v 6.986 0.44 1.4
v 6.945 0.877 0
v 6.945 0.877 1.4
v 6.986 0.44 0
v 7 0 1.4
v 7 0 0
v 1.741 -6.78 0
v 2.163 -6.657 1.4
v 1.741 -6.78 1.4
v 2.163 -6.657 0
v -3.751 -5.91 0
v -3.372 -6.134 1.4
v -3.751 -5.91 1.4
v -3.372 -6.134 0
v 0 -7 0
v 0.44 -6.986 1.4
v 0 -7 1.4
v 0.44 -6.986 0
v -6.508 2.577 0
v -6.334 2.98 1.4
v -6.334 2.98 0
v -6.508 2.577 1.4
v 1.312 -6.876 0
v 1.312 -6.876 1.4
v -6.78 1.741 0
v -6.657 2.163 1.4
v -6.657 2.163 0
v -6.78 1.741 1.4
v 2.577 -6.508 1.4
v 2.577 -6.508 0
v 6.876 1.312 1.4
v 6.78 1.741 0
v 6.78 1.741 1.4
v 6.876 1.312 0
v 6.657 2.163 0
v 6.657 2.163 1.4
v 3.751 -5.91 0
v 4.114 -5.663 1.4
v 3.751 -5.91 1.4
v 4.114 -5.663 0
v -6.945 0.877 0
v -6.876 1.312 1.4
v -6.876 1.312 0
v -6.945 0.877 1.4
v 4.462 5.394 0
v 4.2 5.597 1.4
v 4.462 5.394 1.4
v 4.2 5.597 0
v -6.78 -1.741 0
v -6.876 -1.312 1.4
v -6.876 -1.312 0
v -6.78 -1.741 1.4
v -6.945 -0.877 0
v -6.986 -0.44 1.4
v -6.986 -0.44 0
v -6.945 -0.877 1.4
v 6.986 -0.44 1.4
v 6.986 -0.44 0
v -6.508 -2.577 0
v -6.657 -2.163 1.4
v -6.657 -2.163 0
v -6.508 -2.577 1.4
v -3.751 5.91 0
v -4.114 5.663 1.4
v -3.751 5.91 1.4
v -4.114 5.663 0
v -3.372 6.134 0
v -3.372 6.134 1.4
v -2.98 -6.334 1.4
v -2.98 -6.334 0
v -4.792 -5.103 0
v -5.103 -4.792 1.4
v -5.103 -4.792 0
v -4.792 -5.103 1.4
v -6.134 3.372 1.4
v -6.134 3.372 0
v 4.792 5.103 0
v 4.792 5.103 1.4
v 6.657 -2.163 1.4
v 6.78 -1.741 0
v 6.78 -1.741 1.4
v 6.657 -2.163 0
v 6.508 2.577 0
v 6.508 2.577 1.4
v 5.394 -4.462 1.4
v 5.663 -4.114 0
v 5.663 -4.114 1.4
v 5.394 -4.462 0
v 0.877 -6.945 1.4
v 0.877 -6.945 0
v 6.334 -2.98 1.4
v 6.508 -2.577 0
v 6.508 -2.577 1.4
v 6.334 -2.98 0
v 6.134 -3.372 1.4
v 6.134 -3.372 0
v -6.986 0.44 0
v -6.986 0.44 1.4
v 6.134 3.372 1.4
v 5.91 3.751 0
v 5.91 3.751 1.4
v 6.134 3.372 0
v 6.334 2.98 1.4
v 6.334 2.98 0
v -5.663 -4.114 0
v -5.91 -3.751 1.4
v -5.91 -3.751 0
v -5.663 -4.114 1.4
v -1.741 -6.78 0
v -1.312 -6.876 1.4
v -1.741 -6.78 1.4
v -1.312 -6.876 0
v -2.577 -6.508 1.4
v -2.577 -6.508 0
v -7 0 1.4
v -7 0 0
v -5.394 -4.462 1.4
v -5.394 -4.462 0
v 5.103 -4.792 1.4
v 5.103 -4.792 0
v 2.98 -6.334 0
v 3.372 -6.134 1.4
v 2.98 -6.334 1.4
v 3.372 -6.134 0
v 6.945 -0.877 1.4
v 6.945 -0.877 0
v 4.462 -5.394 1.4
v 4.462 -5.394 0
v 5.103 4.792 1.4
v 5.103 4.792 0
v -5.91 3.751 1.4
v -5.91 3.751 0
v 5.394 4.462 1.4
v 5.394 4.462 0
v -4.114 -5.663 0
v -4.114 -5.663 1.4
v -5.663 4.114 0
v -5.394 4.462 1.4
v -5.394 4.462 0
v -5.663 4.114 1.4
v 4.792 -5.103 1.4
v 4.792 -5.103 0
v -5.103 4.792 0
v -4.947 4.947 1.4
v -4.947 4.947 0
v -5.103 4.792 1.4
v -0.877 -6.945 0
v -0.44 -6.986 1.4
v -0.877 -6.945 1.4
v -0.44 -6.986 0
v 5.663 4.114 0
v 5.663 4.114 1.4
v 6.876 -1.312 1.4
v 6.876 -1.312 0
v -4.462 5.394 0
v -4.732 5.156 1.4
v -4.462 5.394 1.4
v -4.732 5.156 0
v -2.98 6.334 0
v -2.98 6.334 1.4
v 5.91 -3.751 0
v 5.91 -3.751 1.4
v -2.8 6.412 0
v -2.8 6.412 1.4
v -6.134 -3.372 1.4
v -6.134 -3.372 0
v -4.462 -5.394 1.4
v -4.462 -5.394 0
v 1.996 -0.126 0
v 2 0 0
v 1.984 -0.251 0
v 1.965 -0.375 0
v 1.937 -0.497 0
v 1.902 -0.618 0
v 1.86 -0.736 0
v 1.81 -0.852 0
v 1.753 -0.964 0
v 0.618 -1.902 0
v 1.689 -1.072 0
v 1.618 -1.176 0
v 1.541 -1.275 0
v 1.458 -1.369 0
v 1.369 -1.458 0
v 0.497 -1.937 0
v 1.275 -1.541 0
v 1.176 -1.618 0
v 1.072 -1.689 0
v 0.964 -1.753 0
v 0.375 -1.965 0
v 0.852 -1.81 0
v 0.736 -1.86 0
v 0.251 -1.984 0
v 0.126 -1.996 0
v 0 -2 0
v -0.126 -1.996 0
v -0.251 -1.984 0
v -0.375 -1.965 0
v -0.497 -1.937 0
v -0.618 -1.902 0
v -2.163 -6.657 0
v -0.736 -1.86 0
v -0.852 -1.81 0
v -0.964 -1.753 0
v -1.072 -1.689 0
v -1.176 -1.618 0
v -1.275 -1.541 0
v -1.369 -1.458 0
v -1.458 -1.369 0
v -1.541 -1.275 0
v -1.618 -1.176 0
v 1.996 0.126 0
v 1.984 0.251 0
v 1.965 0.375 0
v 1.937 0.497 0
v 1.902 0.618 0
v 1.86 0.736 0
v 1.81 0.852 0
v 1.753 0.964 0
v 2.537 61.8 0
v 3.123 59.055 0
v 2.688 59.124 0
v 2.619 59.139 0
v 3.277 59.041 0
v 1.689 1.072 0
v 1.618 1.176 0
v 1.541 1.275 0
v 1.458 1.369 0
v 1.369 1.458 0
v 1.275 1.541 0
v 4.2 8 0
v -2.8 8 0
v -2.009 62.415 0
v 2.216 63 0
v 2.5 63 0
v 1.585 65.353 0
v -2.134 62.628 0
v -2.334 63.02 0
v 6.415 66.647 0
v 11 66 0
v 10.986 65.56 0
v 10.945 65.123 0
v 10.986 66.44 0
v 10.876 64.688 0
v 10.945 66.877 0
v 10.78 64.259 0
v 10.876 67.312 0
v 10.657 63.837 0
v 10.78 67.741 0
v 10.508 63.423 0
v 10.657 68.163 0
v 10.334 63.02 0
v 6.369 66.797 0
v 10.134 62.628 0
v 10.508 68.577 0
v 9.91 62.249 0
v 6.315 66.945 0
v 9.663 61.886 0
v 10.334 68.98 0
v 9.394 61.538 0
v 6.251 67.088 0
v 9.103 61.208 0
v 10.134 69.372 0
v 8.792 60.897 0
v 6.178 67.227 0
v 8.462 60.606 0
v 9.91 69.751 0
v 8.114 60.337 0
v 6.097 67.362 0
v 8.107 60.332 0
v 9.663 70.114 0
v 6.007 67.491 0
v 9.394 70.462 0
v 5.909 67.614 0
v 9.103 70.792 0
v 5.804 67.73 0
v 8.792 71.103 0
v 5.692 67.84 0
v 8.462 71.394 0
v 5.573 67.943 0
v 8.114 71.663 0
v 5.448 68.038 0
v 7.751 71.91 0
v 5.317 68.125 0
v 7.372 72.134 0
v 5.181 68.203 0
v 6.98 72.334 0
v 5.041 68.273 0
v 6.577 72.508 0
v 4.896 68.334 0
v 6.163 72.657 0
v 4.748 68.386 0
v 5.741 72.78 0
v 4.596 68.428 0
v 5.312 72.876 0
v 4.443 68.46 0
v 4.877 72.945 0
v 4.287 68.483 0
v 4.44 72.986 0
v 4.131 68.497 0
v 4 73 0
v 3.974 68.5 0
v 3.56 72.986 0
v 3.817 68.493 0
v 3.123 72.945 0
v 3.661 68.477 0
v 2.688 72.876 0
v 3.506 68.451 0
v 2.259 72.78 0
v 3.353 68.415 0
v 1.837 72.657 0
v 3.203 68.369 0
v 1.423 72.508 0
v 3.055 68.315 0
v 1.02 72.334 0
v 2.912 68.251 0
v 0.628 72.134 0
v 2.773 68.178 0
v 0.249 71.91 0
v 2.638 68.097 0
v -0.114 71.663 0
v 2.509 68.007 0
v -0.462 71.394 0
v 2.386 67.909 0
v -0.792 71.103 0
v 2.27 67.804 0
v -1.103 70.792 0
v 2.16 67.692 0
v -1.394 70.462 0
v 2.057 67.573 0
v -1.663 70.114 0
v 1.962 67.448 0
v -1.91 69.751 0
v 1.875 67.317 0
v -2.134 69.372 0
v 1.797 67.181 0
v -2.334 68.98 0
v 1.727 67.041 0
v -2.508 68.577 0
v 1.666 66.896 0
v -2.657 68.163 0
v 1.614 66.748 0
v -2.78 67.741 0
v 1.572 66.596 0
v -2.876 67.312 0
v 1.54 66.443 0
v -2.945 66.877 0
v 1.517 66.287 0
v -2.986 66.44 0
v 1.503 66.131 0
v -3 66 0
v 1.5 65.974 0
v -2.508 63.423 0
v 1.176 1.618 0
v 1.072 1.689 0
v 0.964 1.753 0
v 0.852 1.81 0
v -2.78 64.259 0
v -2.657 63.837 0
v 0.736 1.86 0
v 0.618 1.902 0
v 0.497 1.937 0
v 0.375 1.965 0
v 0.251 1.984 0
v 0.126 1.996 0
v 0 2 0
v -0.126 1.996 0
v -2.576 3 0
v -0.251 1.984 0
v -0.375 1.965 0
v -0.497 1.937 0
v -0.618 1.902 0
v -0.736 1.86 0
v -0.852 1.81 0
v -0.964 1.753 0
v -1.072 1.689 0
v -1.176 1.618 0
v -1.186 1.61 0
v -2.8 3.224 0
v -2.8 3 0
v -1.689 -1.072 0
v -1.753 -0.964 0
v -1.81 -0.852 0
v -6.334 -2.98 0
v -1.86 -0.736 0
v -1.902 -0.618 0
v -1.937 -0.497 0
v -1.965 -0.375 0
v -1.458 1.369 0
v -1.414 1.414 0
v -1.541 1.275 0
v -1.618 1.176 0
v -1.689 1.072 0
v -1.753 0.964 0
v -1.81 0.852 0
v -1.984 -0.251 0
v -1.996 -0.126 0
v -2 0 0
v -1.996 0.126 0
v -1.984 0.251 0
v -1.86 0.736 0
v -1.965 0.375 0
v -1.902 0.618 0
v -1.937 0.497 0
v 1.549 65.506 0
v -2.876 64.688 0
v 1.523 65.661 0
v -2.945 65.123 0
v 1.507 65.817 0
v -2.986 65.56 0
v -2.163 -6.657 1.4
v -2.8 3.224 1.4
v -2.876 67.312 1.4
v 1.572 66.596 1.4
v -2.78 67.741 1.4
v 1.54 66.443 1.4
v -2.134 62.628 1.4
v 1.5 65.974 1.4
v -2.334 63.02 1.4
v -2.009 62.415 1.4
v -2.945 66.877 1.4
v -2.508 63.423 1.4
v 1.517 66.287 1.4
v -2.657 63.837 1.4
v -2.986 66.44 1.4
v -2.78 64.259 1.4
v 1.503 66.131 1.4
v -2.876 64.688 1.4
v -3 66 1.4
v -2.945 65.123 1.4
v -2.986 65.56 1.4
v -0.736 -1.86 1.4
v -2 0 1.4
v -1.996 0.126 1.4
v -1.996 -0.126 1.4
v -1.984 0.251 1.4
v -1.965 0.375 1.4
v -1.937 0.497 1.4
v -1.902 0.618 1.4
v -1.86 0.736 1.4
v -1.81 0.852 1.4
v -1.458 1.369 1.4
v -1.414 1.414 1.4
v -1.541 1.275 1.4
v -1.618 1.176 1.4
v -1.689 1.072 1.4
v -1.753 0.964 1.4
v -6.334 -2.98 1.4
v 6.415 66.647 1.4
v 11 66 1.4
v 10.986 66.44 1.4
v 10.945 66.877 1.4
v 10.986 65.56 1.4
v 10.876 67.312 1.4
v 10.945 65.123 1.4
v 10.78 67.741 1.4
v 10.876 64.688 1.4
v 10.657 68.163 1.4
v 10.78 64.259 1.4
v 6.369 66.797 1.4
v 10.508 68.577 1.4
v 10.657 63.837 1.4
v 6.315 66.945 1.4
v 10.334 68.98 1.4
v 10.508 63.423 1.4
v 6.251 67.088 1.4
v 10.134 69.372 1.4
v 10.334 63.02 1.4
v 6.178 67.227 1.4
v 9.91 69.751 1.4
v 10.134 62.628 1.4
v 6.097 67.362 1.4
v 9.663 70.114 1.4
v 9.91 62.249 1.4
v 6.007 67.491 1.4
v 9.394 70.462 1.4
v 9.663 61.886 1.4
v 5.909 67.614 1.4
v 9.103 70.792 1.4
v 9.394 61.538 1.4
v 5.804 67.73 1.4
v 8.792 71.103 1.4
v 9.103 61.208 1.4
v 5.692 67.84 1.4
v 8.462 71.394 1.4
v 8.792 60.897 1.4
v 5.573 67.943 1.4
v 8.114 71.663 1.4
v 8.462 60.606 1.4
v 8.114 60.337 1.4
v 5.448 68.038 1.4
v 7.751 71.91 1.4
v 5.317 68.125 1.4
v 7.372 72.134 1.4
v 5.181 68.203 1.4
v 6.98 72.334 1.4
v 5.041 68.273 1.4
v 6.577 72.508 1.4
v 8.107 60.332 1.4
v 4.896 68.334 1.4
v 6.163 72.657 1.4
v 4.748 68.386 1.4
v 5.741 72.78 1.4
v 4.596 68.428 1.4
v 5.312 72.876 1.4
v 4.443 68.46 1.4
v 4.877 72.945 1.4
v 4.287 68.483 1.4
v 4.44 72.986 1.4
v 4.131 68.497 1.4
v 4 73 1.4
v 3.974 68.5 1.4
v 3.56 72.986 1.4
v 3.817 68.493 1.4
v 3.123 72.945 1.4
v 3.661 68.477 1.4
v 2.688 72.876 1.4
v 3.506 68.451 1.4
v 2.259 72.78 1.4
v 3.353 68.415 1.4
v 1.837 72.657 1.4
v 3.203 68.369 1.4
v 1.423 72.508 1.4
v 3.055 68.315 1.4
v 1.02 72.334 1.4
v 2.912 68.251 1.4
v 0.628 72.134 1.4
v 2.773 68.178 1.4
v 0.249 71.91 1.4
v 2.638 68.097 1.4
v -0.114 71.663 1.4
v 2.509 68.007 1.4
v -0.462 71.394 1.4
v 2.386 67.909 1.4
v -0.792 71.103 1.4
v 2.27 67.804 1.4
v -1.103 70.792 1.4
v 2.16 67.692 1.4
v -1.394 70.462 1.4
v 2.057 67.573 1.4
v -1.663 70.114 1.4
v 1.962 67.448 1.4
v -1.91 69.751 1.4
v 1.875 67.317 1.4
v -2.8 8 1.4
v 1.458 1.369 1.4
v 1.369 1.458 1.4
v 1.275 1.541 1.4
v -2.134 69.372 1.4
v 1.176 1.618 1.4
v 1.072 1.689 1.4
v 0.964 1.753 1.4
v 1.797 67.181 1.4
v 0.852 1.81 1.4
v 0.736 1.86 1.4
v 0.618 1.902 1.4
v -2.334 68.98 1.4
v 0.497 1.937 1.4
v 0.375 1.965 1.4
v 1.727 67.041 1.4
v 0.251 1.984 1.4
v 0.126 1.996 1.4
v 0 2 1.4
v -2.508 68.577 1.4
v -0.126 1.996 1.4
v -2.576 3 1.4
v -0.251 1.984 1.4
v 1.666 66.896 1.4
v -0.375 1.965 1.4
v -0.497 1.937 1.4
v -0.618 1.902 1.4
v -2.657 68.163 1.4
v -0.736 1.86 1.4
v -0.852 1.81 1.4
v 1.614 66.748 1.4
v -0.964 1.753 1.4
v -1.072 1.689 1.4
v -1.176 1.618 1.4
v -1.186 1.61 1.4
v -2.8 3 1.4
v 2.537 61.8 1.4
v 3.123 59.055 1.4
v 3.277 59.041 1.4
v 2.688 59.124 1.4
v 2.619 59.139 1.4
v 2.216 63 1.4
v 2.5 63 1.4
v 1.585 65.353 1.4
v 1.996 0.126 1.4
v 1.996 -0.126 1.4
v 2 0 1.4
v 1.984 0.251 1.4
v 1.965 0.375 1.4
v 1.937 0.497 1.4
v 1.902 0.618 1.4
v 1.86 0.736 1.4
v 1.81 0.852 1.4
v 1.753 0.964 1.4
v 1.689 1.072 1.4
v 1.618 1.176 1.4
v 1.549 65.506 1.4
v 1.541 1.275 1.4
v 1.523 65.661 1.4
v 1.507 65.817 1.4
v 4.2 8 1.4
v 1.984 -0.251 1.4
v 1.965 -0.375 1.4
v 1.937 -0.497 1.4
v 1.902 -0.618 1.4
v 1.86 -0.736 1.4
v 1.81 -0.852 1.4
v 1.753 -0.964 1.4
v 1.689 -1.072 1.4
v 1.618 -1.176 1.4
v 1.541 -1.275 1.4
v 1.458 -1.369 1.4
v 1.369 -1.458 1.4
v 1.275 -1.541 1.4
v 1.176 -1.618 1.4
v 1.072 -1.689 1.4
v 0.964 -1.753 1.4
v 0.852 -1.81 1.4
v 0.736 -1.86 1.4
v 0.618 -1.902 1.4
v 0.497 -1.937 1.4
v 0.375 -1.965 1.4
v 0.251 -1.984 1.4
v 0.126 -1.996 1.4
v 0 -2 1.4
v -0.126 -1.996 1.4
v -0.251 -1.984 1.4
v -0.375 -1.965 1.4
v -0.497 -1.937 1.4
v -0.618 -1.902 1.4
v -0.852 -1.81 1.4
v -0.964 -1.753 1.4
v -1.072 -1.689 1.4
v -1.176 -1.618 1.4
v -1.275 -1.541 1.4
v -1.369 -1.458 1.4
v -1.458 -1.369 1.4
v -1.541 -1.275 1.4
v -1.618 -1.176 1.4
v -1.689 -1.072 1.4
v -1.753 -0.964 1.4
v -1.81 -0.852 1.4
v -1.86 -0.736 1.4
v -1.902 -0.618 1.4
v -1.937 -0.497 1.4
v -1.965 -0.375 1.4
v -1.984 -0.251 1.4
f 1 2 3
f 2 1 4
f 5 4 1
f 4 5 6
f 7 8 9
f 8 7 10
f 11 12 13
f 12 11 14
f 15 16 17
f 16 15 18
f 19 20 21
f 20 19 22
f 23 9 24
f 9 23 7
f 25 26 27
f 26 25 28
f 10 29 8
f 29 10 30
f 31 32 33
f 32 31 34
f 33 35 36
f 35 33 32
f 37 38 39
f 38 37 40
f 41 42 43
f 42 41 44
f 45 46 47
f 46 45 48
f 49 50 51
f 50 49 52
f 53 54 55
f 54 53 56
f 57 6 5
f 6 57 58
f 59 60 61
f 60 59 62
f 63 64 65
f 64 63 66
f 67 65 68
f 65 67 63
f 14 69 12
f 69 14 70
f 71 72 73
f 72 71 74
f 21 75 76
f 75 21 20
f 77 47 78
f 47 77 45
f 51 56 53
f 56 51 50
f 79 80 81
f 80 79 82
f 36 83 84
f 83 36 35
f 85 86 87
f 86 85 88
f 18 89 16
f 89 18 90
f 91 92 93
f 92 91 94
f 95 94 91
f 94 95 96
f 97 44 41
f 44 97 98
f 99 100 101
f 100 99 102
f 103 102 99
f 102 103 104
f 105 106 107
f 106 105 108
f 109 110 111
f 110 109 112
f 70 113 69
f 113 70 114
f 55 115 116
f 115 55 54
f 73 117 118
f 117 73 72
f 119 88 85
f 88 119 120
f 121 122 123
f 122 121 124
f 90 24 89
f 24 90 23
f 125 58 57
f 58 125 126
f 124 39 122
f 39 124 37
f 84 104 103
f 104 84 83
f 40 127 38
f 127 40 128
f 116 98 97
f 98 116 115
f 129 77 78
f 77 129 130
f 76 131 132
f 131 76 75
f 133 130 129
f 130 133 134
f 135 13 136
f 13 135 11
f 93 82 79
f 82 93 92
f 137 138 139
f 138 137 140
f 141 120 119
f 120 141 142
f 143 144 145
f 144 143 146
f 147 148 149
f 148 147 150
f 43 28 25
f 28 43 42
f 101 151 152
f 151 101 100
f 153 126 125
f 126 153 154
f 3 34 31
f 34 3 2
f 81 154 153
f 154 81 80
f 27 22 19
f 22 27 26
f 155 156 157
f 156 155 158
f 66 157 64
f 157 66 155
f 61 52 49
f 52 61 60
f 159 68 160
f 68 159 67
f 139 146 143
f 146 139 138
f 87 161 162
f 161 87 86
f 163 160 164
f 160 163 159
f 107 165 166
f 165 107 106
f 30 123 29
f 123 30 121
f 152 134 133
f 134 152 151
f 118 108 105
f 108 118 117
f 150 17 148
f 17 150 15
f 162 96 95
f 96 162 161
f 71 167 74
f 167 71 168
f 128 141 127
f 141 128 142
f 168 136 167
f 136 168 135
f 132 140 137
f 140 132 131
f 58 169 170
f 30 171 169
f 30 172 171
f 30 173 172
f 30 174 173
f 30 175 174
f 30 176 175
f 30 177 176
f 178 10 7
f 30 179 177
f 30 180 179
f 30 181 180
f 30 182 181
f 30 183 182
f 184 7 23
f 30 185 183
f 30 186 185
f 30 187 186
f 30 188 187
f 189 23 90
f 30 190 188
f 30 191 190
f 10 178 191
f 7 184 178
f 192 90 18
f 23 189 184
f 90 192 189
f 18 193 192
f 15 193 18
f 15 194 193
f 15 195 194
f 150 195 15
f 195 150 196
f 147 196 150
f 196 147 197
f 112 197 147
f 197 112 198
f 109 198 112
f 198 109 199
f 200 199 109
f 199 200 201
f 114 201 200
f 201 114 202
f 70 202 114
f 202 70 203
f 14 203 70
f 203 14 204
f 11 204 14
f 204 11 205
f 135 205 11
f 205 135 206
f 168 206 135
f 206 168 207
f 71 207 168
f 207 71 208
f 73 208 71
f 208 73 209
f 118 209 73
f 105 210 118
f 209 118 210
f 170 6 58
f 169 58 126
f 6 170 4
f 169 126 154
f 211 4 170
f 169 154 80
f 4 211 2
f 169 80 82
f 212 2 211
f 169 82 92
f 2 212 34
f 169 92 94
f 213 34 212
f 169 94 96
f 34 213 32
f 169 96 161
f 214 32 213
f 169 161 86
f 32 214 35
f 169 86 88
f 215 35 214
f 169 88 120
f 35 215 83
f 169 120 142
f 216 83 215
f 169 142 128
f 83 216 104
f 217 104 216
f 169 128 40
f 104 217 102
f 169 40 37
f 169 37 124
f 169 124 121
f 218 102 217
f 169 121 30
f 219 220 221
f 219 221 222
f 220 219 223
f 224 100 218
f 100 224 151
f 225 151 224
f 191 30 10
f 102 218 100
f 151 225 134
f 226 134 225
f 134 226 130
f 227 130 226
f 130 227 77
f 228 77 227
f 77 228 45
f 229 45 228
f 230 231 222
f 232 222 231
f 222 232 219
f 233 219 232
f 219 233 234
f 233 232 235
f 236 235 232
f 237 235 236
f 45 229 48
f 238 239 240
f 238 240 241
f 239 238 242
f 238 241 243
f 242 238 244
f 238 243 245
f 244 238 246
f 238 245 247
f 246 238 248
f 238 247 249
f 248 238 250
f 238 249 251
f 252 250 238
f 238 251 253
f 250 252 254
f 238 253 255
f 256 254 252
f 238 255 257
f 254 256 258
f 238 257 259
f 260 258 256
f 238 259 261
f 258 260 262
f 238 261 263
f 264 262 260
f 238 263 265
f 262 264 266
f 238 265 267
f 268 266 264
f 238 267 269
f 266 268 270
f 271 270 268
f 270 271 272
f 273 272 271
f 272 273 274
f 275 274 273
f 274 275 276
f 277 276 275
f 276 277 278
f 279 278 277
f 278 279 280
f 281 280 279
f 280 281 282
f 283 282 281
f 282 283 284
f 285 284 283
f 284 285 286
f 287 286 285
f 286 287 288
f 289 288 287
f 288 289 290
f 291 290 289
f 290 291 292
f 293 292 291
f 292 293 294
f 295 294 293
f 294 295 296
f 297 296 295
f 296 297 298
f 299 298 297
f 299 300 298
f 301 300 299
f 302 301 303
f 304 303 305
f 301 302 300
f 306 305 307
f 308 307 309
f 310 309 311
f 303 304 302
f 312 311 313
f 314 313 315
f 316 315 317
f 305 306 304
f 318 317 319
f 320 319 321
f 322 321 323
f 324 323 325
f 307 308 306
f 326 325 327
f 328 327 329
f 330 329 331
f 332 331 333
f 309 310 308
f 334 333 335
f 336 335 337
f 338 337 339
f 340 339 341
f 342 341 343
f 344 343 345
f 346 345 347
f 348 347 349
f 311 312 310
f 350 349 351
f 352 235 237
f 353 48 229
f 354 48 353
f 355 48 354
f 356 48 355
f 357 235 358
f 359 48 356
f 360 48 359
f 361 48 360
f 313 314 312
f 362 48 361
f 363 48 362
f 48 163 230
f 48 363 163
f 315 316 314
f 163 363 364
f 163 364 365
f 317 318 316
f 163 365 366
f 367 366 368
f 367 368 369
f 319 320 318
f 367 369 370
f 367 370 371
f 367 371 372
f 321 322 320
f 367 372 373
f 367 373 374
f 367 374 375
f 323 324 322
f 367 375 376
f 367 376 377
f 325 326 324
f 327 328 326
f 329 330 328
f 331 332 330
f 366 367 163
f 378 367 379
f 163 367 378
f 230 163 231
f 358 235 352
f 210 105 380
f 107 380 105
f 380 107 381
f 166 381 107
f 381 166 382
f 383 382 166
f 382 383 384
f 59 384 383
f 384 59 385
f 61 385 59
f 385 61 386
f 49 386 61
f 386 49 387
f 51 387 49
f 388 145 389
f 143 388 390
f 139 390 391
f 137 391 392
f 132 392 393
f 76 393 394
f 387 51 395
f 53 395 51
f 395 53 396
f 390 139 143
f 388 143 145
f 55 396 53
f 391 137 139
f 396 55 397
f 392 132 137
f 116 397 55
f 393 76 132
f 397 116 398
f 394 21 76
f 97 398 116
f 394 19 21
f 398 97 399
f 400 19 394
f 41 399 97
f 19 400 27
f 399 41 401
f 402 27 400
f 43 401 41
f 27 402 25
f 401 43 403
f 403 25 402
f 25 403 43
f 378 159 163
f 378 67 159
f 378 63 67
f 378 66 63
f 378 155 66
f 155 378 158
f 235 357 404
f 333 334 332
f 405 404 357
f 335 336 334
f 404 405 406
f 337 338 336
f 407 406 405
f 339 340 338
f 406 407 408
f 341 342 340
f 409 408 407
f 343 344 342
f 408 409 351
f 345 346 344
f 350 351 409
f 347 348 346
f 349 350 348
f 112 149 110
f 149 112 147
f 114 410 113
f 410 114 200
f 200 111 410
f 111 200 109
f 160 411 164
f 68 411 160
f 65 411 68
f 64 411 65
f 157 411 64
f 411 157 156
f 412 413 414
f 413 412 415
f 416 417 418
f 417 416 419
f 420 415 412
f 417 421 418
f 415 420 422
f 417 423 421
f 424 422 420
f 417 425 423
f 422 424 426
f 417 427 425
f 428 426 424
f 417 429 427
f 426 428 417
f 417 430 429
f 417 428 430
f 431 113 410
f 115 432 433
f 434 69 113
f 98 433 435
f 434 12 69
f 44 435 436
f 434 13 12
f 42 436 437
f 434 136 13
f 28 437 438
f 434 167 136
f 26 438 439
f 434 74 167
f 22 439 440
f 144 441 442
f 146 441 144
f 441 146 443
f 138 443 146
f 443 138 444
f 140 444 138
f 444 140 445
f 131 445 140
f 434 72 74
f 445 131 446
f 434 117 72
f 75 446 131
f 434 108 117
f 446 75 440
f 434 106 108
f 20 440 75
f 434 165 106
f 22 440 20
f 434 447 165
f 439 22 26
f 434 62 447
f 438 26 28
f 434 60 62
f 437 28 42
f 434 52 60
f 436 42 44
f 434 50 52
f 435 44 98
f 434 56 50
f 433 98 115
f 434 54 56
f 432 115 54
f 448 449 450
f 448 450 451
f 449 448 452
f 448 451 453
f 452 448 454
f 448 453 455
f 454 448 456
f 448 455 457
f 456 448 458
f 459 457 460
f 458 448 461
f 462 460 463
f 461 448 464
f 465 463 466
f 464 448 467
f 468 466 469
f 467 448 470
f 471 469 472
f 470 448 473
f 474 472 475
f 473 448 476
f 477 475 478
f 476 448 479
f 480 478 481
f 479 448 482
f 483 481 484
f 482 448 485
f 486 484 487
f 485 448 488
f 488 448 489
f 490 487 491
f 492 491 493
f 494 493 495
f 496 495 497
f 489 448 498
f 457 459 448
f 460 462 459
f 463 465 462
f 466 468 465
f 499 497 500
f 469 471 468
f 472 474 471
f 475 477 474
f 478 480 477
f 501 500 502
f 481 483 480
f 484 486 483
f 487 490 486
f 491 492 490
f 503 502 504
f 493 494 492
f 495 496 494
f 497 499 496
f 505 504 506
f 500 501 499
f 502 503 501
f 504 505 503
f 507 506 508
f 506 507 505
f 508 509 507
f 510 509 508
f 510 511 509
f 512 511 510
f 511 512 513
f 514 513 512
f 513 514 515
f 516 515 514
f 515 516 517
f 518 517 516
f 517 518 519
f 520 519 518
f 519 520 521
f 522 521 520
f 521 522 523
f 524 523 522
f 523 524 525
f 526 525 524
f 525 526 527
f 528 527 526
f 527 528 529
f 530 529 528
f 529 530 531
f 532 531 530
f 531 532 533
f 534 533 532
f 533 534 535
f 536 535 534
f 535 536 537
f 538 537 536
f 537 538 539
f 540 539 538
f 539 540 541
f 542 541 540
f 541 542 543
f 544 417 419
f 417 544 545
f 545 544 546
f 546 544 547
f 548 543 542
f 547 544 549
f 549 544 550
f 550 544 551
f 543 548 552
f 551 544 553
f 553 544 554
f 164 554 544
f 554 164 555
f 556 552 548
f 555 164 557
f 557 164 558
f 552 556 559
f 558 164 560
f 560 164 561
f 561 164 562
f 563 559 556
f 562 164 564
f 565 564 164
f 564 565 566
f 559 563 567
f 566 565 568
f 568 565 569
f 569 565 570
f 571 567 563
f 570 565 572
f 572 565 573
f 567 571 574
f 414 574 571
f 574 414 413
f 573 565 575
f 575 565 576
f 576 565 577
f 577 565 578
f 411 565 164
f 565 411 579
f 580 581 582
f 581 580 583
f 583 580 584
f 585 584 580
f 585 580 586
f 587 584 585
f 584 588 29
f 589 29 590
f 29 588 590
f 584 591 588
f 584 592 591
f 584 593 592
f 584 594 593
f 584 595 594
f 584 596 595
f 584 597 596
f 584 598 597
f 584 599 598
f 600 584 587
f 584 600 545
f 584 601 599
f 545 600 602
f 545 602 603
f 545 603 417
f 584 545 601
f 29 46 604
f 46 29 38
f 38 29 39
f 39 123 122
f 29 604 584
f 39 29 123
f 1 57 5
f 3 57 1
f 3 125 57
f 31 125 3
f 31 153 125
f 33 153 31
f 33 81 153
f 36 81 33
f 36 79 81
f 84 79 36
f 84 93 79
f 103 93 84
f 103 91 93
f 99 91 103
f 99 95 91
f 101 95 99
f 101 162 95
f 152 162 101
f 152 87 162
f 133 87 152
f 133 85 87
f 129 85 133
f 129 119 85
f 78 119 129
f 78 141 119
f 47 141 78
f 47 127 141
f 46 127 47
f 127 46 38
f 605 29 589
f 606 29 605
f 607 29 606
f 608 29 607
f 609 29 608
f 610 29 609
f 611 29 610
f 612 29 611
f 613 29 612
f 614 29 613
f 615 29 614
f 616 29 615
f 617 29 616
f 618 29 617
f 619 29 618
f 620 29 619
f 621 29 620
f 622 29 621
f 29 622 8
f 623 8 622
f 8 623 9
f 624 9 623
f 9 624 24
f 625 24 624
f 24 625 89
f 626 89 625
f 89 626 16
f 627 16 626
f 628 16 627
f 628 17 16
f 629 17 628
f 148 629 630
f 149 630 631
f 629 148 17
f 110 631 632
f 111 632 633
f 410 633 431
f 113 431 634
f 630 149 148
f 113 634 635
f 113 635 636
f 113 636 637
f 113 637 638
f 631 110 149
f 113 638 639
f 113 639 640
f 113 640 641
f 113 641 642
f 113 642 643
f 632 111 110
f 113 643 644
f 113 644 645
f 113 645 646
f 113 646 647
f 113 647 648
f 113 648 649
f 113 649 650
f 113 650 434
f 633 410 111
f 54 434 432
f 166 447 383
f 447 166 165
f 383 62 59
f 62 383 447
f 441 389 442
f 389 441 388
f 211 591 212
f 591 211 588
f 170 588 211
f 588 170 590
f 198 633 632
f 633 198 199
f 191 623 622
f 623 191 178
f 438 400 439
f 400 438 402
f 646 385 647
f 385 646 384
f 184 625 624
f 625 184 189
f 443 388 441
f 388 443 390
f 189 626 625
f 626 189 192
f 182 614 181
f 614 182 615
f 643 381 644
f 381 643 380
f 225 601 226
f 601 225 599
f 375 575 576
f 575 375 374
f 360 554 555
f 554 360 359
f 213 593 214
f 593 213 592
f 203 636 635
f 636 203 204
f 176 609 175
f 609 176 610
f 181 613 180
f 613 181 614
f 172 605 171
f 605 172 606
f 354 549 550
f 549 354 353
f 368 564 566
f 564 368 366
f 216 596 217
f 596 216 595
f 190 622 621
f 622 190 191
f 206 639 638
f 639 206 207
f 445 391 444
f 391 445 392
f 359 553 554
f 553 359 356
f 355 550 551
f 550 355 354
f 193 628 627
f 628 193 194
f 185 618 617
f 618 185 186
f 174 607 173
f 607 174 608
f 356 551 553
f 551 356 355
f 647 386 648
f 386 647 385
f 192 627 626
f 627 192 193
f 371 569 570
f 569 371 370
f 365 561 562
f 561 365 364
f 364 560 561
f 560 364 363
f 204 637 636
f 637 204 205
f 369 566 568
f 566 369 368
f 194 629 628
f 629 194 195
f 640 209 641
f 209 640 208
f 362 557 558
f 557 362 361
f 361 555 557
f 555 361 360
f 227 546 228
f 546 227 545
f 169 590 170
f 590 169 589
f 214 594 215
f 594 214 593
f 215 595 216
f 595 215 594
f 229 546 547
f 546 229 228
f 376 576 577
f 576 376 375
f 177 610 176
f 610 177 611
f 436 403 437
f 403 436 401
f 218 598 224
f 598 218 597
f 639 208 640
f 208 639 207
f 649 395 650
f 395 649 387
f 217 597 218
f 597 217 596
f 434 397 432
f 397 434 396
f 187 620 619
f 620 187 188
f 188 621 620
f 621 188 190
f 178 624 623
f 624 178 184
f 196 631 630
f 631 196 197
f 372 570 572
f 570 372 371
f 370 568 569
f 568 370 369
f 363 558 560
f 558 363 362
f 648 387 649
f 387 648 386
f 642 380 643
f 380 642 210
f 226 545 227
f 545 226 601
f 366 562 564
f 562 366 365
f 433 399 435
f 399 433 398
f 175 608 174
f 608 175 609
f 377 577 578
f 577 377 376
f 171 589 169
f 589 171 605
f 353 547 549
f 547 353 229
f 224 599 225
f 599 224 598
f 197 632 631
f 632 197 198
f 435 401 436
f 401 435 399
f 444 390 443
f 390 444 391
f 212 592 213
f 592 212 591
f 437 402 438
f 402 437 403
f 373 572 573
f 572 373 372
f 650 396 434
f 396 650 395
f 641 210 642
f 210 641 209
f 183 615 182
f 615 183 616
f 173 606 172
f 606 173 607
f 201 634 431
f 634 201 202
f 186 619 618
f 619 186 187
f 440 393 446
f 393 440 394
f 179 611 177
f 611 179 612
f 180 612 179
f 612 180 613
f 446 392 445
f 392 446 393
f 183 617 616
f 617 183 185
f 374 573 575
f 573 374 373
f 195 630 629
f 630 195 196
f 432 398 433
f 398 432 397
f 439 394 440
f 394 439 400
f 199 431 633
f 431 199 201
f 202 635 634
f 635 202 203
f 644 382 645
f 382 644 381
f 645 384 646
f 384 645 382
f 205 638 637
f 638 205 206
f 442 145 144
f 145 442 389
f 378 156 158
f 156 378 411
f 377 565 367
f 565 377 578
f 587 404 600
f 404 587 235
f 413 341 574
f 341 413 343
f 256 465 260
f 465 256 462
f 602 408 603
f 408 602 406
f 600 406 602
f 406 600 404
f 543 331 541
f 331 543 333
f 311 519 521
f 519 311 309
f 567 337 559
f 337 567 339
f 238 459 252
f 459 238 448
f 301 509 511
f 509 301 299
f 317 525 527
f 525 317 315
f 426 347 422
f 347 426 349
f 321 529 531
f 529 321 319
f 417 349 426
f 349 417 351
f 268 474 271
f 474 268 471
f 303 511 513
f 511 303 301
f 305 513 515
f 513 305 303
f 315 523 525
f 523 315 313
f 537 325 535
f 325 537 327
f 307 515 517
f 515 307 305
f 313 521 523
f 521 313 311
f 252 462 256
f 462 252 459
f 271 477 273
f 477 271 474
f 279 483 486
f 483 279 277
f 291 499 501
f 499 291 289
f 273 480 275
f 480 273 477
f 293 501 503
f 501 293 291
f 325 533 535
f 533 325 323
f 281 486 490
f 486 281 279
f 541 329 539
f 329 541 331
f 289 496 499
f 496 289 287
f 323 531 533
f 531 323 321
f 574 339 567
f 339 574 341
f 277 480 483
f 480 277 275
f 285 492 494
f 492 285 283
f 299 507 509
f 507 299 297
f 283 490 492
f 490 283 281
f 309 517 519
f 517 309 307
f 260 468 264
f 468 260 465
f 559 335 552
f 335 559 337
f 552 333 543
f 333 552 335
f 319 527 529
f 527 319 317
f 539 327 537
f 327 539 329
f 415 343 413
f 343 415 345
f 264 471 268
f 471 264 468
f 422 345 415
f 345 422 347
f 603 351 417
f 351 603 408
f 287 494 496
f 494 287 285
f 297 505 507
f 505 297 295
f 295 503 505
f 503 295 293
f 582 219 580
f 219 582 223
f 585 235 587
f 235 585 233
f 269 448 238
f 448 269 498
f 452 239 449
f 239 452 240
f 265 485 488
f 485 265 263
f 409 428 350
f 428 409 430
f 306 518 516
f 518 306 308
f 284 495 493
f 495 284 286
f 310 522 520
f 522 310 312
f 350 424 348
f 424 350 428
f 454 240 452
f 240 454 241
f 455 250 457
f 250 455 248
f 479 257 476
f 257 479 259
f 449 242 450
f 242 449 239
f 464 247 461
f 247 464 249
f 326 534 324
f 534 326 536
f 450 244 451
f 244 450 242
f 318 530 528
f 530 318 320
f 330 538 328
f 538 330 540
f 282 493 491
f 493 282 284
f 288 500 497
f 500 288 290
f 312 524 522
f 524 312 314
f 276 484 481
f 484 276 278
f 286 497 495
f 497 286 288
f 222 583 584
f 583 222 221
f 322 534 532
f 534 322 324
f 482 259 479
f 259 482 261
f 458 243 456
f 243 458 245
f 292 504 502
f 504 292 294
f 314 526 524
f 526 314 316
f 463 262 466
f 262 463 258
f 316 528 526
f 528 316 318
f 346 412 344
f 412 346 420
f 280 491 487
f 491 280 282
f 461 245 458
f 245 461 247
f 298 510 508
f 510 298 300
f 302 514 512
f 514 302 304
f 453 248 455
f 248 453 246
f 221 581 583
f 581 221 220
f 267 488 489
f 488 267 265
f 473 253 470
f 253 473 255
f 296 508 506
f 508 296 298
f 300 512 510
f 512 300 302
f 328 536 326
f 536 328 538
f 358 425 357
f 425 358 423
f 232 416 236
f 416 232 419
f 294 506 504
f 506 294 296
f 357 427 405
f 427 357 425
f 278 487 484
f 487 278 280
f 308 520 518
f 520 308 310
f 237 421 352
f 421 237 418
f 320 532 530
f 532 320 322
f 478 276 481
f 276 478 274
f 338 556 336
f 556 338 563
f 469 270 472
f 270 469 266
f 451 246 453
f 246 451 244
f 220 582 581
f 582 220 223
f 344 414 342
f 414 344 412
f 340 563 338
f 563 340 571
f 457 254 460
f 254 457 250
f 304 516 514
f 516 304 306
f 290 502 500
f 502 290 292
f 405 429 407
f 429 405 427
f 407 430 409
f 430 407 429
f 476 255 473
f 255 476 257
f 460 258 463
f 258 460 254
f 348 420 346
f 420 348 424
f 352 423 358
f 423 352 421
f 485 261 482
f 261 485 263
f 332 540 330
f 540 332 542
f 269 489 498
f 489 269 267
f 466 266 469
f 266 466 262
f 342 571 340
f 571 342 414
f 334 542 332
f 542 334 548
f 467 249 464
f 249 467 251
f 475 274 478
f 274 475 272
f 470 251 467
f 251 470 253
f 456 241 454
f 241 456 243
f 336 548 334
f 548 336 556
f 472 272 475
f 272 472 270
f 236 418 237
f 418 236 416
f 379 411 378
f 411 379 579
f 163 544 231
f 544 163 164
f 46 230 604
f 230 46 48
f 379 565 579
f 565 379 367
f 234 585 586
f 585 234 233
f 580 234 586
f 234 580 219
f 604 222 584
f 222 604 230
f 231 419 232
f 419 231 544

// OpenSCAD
y_delka=58;

module prvni_kruh(){
difference(){   
   cylinder(h=1.4,r=7, $fn=100); 
translate([0,0,-0.1]) cylinder(h=1.6,r=2, $fn=100); //odectena
//vyrez
rotate(45) translate([0,0,-0.1]) cube([0.3,7,1.6]);
}
}

module spojka(){
hull(){
translate([-2.8,3,0]) cube([7,5,1.4]); //prvni kostka v prvnim kruhu
translate([-2,y_delka,0]) cube([4.5,5,1.4]); //druha v druhem kruhu
}
}

module druhy_kruh0(){
//translate([8.5,46,0]){
cylinder(h=1.4,r=7, $fn=100);
}

module odecet_druhy_kruh(){
translate([0,0,-0.1]) rotate(195){
    cylinder(h=1.6,r=2.5, $fn=100); 
    translate([-2.5,0,0]) cube([5,15,1.6]);
}}



module druhy_kruh(){
translate([4,y_delka+8,0])
difference() {
druhy_kruh0(); 
    odecet_druhy_kruh();
    }
}


prvni_kruh();
spojka();
druhy_kruh();
